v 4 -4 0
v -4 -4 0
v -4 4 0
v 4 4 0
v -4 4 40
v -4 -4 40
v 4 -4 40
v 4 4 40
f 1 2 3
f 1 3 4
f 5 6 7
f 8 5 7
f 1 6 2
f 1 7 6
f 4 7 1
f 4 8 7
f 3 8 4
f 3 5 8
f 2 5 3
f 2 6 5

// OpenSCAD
// Auto-generated from tests/data/feature_fixtures_manifest.json
// fixture: non_revolve_tall_box
// fixture_type: non_revolve
// description: Tall square-section prism; cross-slice radial profiles vary by angle, must be rejected as revolve.
$fn = 96;

side = 8.000000;
height = 40.000000;

translate([-side/2, -side/2, 0]) linear_extrude(height) square(side);
